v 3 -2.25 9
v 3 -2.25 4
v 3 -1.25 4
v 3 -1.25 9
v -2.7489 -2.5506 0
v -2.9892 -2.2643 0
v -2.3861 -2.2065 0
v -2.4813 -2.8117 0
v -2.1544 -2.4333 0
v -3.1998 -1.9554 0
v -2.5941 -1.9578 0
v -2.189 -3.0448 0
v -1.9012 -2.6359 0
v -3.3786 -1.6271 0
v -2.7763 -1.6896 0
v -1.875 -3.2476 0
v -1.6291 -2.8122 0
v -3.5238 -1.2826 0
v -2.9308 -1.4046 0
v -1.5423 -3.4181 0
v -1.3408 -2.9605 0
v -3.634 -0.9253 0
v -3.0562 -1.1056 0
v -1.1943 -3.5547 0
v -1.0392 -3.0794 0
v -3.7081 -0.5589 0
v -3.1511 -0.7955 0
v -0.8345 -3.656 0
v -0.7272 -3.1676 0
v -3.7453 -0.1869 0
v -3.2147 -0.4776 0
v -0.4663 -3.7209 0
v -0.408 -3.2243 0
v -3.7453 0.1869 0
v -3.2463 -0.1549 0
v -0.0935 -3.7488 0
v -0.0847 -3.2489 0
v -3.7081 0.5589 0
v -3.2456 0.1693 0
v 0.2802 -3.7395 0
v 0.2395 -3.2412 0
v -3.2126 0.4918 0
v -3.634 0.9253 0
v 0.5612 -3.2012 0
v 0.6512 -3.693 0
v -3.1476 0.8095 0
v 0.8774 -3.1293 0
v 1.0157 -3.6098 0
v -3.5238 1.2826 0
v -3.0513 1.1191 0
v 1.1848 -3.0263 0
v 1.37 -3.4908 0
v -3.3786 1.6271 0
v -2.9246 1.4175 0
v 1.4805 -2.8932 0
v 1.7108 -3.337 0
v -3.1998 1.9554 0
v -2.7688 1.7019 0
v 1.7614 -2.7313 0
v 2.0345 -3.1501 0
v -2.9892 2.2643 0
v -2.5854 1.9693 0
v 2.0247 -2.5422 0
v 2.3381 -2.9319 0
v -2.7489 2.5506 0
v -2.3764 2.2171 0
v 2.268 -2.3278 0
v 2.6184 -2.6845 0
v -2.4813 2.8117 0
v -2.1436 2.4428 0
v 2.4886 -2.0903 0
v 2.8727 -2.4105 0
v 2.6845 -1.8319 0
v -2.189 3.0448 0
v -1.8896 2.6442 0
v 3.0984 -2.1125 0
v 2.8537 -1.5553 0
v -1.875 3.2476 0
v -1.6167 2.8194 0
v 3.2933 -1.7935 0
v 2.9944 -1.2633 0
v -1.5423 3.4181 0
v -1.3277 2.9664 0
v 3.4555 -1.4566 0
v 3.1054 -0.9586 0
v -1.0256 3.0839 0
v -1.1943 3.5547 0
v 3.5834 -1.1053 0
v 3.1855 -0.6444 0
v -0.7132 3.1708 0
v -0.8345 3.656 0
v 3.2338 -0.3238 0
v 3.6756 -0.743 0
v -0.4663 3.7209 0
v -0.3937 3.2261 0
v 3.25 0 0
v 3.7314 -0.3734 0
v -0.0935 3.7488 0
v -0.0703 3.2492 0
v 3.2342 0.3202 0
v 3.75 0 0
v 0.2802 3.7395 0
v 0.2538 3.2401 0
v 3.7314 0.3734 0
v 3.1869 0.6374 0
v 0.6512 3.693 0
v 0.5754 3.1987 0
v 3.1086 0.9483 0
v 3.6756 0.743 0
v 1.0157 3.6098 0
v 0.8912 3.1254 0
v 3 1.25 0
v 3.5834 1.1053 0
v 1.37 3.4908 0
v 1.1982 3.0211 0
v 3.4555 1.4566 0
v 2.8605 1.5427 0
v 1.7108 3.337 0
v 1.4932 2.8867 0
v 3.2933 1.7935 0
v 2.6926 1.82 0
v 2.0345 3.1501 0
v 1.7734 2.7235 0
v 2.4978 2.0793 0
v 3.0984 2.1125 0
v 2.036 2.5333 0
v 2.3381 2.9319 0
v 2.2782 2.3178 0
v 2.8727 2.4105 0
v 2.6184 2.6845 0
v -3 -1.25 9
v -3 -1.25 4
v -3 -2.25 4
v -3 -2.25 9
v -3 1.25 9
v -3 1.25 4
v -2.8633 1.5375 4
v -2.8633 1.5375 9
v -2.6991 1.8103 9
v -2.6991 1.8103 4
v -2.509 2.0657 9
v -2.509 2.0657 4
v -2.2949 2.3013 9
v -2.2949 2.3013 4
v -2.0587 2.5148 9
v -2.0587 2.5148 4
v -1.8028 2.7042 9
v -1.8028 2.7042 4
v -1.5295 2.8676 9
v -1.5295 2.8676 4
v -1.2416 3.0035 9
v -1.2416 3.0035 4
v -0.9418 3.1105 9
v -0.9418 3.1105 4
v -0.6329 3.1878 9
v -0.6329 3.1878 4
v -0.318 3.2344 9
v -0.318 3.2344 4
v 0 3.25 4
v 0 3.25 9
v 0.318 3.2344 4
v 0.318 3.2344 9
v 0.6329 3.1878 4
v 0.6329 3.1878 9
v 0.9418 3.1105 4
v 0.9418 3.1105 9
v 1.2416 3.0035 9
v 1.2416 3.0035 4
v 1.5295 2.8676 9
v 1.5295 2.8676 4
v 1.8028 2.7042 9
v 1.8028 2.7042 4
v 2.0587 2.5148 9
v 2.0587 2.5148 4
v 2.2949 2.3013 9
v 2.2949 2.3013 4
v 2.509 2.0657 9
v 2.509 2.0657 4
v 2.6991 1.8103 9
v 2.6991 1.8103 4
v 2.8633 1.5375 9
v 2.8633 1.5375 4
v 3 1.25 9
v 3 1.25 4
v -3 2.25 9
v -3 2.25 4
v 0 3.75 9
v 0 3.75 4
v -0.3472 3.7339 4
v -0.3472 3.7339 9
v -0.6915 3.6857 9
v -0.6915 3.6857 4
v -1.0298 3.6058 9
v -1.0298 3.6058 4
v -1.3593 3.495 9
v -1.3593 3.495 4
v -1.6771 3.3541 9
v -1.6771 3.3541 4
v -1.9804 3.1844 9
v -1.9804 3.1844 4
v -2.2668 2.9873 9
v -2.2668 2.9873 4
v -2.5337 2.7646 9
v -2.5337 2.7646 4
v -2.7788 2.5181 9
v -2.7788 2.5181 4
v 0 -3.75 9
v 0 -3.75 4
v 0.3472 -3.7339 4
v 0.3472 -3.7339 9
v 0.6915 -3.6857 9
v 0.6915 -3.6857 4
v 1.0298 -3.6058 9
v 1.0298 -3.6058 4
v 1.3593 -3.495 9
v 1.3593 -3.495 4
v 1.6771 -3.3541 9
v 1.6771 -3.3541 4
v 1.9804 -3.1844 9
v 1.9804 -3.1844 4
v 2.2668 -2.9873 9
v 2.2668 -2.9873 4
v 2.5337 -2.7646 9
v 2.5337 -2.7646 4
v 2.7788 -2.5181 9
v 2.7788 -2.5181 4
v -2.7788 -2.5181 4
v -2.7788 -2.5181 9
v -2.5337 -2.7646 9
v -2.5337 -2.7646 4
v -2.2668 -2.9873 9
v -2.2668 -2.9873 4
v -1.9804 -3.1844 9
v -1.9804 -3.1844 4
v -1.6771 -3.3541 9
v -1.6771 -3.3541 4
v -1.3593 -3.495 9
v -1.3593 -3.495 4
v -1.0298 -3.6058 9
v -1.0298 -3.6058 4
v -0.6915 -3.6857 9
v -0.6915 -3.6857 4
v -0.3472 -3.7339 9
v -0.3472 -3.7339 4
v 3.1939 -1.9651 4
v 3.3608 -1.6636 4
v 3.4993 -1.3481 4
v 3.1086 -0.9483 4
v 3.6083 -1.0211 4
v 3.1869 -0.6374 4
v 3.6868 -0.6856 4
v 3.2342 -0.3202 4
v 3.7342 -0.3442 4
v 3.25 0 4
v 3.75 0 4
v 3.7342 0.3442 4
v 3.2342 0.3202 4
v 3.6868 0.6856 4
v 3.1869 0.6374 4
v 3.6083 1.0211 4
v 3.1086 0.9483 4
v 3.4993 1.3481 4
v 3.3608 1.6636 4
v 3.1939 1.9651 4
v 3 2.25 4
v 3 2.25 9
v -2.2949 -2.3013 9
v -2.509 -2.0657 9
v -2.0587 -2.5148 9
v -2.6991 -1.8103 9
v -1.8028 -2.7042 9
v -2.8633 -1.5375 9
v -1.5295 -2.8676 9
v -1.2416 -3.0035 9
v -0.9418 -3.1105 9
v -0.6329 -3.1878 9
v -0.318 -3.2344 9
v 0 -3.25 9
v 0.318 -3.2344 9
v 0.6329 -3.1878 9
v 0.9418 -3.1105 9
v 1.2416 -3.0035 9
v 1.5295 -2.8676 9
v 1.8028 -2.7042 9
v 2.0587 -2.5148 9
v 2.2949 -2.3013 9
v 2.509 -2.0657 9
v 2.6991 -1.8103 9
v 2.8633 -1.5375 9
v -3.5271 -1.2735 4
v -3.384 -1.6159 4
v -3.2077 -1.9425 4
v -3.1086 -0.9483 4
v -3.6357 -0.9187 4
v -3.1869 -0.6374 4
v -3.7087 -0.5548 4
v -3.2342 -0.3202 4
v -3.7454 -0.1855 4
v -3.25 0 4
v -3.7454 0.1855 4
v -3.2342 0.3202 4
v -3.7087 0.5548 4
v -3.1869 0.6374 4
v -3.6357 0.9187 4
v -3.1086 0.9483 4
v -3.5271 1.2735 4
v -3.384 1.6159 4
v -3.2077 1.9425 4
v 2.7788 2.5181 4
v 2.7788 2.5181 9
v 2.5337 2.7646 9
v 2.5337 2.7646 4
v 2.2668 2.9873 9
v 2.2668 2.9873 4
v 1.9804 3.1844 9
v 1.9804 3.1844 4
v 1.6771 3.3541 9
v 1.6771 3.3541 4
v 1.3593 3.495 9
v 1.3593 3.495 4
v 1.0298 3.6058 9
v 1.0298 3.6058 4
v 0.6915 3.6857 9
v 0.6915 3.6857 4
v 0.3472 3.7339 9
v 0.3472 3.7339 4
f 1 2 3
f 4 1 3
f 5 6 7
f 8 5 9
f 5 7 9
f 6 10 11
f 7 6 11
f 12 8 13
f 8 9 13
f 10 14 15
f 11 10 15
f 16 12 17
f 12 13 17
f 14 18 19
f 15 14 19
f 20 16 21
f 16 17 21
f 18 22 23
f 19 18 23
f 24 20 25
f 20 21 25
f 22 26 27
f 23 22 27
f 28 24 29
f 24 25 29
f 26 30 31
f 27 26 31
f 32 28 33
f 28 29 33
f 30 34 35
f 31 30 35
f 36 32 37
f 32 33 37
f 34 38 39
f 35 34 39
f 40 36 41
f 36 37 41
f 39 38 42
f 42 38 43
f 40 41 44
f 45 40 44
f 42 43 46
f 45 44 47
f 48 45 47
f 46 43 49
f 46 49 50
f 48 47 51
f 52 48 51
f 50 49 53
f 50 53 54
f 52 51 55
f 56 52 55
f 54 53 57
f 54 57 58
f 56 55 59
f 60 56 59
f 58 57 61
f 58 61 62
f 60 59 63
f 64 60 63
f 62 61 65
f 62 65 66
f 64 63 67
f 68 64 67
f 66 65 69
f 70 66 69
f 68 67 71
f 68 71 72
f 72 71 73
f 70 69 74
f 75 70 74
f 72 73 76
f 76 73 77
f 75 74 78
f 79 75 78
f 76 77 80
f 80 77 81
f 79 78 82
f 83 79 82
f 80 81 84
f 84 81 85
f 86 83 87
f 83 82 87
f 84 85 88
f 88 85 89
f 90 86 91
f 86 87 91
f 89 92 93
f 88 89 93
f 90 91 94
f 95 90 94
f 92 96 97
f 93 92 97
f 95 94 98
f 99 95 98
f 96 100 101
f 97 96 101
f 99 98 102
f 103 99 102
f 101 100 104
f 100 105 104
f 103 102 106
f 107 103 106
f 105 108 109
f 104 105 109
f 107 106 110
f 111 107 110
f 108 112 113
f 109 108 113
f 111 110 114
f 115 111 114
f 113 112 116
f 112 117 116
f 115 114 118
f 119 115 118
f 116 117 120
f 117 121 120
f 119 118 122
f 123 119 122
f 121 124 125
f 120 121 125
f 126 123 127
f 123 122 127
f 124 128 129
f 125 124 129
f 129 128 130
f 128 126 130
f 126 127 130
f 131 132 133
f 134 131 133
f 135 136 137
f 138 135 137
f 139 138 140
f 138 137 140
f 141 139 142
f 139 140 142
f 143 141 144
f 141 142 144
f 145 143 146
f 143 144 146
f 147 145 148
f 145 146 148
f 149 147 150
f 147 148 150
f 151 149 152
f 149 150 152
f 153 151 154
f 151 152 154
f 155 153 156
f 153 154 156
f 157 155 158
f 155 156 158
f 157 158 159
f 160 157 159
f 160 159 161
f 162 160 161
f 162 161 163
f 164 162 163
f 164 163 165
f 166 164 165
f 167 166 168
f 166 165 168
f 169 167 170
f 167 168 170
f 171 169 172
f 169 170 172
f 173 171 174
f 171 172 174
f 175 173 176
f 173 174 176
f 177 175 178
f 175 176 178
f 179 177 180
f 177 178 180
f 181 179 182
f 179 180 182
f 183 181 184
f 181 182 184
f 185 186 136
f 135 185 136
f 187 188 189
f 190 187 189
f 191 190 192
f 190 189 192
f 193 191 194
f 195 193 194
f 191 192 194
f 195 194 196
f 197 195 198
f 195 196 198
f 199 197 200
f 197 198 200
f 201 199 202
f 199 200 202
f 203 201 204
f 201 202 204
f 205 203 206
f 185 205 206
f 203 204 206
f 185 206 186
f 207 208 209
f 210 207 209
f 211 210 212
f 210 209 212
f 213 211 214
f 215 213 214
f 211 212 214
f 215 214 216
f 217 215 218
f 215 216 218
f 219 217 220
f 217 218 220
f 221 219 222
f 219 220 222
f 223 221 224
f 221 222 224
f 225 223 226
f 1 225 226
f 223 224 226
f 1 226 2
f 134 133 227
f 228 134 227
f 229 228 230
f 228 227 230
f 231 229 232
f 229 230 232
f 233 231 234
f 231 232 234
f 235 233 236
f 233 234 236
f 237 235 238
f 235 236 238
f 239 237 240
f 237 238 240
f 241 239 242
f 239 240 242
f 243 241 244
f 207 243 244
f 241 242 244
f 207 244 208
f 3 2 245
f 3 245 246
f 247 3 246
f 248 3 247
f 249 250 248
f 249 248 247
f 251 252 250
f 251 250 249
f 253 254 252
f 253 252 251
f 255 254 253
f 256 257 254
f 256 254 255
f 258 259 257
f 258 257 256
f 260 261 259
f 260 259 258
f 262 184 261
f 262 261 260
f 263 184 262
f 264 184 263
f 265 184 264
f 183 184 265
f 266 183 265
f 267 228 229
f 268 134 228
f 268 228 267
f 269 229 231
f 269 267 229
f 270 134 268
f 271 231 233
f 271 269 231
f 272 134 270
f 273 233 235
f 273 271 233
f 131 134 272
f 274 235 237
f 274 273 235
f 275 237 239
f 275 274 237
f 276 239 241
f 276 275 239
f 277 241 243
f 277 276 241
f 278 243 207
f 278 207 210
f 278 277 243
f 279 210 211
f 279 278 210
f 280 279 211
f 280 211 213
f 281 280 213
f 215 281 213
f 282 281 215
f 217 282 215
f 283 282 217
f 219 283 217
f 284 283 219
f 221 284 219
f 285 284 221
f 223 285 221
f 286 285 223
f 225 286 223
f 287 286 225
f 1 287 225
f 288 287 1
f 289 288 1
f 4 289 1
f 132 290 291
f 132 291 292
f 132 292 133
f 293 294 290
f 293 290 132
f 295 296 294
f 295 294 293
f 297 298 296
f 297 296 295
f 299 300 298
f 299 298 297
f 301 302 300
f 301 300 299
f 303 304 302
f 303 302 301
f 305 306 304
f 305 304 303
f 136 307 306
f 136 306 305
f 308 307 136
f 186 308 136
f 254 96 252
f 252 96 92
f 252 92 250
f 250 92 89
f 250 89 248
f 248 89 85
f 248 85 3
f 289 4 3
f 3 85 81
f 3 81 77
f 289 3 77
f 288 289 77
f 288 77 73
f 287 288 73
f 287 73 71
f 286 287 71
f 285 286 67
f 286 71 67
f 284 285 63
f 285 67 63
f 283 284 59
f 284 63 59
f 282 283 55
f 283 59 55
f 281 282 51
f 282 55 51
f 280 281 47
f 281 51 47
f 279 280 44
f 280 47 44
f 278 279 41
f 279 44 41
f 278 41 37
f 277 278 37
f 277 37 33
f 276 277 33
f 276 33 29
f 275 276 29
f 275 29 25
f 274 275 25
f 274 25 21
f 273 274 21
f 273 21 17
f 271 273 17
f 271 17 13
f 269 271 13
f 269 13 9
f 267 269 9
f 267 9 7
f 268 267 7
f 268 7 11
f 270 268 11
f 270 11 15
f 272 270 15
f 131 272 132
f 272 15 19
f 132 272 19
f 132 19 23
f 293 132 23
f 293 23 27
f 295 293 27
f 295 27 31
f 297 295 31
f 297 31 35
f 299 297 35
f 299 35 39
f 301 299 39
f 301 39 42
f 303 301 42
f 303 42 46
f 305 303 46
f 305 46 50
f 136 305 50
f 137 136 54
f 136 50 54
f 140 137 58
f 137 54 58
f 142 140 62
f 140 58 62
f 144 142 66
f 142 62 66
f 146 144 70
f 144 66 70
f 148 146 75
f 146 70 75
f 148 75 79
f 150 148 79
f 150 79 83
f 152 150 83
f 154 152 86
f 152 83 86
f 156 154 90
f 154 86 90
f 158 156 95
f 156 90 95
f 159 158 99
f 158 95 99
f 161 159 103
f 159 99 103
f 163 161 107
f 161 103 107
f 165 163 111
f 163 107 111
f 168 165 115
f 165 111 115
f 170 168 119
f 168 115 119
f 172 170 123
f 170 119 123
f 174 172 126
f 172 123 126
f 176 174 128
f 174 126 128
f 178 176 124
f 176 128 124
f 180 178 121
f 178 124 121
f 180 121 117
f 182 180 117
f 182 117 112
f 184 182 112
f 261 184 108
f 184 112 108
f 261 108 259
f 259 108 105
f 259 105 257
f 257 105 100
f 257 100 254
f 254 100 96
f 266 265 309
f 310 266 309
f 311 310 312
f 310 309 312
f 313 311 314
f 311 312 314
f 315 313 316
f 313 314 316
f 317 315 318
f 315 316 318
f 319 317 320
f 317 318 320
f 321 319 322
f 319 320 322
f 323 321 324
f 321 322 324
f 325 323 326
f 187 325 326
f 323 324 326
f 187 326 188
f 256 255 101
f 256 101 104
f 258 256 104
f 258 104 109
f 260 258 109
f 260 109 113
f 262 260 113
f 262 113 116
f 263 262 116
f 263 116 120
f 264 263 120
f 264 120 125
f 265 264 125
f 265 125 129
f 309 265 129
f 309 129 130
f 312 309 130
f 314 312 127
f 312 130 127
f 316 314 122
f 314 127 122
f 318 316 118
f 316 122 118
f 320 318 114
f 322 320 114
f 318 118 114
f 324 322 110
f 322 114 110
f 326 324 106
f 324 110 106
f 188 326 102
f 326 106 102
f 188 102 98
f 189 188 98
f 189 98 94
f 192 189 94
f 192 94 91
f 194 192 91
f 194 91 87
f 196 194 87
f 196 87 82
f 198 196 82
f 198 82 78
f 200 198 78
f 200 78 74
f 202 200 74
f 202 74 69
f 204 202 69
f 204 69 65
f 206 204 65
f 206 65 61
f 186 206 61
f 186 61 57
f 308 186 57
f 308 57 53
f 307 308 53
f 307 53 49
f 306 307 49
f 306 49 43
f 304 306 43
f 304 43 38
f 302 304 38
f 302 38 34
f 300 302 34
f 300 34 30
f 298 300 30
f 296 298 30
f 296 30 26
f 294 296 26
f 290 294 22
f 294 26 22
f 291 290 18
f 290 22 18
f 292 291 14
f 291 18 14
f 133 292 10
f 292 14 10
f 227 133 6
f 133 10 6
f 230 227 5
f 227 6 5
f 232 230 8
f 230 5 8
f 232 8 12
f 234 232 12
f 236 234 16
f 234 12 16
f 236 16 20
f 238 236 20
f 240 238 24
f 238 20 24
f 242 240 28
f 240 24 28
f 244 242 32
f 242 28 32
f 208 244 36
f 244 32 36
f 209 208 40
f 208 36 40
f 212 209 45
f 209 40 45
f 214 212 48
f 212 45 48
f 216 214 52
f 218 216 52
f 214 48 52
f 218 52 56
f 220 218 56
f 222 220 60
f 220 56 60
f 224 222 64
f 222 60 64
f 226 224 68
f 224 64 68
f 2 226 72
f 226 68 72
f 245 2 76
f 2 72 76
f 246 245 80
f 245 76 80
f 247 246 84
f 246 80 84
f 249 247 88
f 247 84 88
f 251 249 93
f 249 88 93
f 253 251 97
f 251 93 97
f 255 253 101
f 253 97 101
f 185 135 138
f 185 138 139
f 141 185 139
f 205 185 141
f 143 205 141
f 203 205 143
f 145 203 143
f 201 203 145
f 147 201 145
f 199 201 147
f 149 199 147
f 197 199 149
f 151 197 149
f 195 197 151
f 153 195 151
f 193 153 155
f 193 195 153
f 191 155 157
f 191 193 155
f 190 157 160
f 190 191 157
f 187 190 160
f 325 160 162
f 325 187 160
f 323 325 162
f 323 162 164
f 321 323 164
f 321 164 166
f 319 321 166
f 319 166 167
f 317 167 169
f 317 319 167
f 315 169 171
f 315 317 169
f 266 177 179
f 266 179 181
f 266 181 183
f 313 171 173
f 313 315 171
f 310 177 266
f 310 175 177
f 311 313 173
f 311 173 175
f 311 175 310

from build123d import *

# Parameters (mm, degrees)
F0_R     = 3.75
F1_DEPTH = 4
F3_DEPTH = 5
F4_DEPTH = 5


with BuildPart() as f1:
    # F0 (on Top) → F1 (new body)
    with BuildSketch(Plane.XY):
        Circle(F0_R)
    extrude(amount=F1_DEPTH)

    # F2 (on face) → F3 (cut, symmetric)
    with BuildSketch(Plane.XY.offset(4)):
        with BuildLine():
            ThreePointArc((3, -1.25), (3.186887196, -0.6373774392), (3.25, 0))
            ThreePointArc((3.25, 0), (3.186887196, 0.6373774392), (3, 1.25))
            ThreePointArc((3, 1.25), (0, 3.25), (-3, 1.25))
            ThreePointArc((-3, 1.25), (-3.25, 0), (-3, -1.25))
            ThreePointArc((-3, -1.25), (0, -3.25), (3, -1.25))
        make_face()
    extrude(amount=F3_DEPTH, both=True, mode=Mode.SUBTRACT)

    # F2 (on face) → F4 (join)
    with BuildSketch(Plane.XY.offset(4)):
        with BuildLine():
            ThreePointArc((-3, 1.25), (0, 3.25), (3, 1.25))
            Line((3, 1.25), (3, 2.25))
            ThreePointArc((3, 2.25), (1.6770509831, 3.3541019662), (0, 3.75))
            ThreePointArc((0, 3.75), (-1.6770509831, 3.3541019662), (-3, 2.25))
            Line((-3, 2.25), (-3, 1.25))
        make_face()
        with BuildLine():
            Line((3, -2.25), (3, -1.25))
            ThreePointArc((3, -1.25), (0, -3.25), (-3, -1.25))
            Line((-3, -1.25), (-3, -2.25))
            ThreePointArc((-3, -2.25), (-1.6770509831, -3.3541019662), (0, -3.75))
            ThreePointArc((0, -3.75), (1.6770509831, -3.3541019662), (3, -2.25))
        make_face()
    extrude(amount=F4_DEPTH)


solid = f1.part
